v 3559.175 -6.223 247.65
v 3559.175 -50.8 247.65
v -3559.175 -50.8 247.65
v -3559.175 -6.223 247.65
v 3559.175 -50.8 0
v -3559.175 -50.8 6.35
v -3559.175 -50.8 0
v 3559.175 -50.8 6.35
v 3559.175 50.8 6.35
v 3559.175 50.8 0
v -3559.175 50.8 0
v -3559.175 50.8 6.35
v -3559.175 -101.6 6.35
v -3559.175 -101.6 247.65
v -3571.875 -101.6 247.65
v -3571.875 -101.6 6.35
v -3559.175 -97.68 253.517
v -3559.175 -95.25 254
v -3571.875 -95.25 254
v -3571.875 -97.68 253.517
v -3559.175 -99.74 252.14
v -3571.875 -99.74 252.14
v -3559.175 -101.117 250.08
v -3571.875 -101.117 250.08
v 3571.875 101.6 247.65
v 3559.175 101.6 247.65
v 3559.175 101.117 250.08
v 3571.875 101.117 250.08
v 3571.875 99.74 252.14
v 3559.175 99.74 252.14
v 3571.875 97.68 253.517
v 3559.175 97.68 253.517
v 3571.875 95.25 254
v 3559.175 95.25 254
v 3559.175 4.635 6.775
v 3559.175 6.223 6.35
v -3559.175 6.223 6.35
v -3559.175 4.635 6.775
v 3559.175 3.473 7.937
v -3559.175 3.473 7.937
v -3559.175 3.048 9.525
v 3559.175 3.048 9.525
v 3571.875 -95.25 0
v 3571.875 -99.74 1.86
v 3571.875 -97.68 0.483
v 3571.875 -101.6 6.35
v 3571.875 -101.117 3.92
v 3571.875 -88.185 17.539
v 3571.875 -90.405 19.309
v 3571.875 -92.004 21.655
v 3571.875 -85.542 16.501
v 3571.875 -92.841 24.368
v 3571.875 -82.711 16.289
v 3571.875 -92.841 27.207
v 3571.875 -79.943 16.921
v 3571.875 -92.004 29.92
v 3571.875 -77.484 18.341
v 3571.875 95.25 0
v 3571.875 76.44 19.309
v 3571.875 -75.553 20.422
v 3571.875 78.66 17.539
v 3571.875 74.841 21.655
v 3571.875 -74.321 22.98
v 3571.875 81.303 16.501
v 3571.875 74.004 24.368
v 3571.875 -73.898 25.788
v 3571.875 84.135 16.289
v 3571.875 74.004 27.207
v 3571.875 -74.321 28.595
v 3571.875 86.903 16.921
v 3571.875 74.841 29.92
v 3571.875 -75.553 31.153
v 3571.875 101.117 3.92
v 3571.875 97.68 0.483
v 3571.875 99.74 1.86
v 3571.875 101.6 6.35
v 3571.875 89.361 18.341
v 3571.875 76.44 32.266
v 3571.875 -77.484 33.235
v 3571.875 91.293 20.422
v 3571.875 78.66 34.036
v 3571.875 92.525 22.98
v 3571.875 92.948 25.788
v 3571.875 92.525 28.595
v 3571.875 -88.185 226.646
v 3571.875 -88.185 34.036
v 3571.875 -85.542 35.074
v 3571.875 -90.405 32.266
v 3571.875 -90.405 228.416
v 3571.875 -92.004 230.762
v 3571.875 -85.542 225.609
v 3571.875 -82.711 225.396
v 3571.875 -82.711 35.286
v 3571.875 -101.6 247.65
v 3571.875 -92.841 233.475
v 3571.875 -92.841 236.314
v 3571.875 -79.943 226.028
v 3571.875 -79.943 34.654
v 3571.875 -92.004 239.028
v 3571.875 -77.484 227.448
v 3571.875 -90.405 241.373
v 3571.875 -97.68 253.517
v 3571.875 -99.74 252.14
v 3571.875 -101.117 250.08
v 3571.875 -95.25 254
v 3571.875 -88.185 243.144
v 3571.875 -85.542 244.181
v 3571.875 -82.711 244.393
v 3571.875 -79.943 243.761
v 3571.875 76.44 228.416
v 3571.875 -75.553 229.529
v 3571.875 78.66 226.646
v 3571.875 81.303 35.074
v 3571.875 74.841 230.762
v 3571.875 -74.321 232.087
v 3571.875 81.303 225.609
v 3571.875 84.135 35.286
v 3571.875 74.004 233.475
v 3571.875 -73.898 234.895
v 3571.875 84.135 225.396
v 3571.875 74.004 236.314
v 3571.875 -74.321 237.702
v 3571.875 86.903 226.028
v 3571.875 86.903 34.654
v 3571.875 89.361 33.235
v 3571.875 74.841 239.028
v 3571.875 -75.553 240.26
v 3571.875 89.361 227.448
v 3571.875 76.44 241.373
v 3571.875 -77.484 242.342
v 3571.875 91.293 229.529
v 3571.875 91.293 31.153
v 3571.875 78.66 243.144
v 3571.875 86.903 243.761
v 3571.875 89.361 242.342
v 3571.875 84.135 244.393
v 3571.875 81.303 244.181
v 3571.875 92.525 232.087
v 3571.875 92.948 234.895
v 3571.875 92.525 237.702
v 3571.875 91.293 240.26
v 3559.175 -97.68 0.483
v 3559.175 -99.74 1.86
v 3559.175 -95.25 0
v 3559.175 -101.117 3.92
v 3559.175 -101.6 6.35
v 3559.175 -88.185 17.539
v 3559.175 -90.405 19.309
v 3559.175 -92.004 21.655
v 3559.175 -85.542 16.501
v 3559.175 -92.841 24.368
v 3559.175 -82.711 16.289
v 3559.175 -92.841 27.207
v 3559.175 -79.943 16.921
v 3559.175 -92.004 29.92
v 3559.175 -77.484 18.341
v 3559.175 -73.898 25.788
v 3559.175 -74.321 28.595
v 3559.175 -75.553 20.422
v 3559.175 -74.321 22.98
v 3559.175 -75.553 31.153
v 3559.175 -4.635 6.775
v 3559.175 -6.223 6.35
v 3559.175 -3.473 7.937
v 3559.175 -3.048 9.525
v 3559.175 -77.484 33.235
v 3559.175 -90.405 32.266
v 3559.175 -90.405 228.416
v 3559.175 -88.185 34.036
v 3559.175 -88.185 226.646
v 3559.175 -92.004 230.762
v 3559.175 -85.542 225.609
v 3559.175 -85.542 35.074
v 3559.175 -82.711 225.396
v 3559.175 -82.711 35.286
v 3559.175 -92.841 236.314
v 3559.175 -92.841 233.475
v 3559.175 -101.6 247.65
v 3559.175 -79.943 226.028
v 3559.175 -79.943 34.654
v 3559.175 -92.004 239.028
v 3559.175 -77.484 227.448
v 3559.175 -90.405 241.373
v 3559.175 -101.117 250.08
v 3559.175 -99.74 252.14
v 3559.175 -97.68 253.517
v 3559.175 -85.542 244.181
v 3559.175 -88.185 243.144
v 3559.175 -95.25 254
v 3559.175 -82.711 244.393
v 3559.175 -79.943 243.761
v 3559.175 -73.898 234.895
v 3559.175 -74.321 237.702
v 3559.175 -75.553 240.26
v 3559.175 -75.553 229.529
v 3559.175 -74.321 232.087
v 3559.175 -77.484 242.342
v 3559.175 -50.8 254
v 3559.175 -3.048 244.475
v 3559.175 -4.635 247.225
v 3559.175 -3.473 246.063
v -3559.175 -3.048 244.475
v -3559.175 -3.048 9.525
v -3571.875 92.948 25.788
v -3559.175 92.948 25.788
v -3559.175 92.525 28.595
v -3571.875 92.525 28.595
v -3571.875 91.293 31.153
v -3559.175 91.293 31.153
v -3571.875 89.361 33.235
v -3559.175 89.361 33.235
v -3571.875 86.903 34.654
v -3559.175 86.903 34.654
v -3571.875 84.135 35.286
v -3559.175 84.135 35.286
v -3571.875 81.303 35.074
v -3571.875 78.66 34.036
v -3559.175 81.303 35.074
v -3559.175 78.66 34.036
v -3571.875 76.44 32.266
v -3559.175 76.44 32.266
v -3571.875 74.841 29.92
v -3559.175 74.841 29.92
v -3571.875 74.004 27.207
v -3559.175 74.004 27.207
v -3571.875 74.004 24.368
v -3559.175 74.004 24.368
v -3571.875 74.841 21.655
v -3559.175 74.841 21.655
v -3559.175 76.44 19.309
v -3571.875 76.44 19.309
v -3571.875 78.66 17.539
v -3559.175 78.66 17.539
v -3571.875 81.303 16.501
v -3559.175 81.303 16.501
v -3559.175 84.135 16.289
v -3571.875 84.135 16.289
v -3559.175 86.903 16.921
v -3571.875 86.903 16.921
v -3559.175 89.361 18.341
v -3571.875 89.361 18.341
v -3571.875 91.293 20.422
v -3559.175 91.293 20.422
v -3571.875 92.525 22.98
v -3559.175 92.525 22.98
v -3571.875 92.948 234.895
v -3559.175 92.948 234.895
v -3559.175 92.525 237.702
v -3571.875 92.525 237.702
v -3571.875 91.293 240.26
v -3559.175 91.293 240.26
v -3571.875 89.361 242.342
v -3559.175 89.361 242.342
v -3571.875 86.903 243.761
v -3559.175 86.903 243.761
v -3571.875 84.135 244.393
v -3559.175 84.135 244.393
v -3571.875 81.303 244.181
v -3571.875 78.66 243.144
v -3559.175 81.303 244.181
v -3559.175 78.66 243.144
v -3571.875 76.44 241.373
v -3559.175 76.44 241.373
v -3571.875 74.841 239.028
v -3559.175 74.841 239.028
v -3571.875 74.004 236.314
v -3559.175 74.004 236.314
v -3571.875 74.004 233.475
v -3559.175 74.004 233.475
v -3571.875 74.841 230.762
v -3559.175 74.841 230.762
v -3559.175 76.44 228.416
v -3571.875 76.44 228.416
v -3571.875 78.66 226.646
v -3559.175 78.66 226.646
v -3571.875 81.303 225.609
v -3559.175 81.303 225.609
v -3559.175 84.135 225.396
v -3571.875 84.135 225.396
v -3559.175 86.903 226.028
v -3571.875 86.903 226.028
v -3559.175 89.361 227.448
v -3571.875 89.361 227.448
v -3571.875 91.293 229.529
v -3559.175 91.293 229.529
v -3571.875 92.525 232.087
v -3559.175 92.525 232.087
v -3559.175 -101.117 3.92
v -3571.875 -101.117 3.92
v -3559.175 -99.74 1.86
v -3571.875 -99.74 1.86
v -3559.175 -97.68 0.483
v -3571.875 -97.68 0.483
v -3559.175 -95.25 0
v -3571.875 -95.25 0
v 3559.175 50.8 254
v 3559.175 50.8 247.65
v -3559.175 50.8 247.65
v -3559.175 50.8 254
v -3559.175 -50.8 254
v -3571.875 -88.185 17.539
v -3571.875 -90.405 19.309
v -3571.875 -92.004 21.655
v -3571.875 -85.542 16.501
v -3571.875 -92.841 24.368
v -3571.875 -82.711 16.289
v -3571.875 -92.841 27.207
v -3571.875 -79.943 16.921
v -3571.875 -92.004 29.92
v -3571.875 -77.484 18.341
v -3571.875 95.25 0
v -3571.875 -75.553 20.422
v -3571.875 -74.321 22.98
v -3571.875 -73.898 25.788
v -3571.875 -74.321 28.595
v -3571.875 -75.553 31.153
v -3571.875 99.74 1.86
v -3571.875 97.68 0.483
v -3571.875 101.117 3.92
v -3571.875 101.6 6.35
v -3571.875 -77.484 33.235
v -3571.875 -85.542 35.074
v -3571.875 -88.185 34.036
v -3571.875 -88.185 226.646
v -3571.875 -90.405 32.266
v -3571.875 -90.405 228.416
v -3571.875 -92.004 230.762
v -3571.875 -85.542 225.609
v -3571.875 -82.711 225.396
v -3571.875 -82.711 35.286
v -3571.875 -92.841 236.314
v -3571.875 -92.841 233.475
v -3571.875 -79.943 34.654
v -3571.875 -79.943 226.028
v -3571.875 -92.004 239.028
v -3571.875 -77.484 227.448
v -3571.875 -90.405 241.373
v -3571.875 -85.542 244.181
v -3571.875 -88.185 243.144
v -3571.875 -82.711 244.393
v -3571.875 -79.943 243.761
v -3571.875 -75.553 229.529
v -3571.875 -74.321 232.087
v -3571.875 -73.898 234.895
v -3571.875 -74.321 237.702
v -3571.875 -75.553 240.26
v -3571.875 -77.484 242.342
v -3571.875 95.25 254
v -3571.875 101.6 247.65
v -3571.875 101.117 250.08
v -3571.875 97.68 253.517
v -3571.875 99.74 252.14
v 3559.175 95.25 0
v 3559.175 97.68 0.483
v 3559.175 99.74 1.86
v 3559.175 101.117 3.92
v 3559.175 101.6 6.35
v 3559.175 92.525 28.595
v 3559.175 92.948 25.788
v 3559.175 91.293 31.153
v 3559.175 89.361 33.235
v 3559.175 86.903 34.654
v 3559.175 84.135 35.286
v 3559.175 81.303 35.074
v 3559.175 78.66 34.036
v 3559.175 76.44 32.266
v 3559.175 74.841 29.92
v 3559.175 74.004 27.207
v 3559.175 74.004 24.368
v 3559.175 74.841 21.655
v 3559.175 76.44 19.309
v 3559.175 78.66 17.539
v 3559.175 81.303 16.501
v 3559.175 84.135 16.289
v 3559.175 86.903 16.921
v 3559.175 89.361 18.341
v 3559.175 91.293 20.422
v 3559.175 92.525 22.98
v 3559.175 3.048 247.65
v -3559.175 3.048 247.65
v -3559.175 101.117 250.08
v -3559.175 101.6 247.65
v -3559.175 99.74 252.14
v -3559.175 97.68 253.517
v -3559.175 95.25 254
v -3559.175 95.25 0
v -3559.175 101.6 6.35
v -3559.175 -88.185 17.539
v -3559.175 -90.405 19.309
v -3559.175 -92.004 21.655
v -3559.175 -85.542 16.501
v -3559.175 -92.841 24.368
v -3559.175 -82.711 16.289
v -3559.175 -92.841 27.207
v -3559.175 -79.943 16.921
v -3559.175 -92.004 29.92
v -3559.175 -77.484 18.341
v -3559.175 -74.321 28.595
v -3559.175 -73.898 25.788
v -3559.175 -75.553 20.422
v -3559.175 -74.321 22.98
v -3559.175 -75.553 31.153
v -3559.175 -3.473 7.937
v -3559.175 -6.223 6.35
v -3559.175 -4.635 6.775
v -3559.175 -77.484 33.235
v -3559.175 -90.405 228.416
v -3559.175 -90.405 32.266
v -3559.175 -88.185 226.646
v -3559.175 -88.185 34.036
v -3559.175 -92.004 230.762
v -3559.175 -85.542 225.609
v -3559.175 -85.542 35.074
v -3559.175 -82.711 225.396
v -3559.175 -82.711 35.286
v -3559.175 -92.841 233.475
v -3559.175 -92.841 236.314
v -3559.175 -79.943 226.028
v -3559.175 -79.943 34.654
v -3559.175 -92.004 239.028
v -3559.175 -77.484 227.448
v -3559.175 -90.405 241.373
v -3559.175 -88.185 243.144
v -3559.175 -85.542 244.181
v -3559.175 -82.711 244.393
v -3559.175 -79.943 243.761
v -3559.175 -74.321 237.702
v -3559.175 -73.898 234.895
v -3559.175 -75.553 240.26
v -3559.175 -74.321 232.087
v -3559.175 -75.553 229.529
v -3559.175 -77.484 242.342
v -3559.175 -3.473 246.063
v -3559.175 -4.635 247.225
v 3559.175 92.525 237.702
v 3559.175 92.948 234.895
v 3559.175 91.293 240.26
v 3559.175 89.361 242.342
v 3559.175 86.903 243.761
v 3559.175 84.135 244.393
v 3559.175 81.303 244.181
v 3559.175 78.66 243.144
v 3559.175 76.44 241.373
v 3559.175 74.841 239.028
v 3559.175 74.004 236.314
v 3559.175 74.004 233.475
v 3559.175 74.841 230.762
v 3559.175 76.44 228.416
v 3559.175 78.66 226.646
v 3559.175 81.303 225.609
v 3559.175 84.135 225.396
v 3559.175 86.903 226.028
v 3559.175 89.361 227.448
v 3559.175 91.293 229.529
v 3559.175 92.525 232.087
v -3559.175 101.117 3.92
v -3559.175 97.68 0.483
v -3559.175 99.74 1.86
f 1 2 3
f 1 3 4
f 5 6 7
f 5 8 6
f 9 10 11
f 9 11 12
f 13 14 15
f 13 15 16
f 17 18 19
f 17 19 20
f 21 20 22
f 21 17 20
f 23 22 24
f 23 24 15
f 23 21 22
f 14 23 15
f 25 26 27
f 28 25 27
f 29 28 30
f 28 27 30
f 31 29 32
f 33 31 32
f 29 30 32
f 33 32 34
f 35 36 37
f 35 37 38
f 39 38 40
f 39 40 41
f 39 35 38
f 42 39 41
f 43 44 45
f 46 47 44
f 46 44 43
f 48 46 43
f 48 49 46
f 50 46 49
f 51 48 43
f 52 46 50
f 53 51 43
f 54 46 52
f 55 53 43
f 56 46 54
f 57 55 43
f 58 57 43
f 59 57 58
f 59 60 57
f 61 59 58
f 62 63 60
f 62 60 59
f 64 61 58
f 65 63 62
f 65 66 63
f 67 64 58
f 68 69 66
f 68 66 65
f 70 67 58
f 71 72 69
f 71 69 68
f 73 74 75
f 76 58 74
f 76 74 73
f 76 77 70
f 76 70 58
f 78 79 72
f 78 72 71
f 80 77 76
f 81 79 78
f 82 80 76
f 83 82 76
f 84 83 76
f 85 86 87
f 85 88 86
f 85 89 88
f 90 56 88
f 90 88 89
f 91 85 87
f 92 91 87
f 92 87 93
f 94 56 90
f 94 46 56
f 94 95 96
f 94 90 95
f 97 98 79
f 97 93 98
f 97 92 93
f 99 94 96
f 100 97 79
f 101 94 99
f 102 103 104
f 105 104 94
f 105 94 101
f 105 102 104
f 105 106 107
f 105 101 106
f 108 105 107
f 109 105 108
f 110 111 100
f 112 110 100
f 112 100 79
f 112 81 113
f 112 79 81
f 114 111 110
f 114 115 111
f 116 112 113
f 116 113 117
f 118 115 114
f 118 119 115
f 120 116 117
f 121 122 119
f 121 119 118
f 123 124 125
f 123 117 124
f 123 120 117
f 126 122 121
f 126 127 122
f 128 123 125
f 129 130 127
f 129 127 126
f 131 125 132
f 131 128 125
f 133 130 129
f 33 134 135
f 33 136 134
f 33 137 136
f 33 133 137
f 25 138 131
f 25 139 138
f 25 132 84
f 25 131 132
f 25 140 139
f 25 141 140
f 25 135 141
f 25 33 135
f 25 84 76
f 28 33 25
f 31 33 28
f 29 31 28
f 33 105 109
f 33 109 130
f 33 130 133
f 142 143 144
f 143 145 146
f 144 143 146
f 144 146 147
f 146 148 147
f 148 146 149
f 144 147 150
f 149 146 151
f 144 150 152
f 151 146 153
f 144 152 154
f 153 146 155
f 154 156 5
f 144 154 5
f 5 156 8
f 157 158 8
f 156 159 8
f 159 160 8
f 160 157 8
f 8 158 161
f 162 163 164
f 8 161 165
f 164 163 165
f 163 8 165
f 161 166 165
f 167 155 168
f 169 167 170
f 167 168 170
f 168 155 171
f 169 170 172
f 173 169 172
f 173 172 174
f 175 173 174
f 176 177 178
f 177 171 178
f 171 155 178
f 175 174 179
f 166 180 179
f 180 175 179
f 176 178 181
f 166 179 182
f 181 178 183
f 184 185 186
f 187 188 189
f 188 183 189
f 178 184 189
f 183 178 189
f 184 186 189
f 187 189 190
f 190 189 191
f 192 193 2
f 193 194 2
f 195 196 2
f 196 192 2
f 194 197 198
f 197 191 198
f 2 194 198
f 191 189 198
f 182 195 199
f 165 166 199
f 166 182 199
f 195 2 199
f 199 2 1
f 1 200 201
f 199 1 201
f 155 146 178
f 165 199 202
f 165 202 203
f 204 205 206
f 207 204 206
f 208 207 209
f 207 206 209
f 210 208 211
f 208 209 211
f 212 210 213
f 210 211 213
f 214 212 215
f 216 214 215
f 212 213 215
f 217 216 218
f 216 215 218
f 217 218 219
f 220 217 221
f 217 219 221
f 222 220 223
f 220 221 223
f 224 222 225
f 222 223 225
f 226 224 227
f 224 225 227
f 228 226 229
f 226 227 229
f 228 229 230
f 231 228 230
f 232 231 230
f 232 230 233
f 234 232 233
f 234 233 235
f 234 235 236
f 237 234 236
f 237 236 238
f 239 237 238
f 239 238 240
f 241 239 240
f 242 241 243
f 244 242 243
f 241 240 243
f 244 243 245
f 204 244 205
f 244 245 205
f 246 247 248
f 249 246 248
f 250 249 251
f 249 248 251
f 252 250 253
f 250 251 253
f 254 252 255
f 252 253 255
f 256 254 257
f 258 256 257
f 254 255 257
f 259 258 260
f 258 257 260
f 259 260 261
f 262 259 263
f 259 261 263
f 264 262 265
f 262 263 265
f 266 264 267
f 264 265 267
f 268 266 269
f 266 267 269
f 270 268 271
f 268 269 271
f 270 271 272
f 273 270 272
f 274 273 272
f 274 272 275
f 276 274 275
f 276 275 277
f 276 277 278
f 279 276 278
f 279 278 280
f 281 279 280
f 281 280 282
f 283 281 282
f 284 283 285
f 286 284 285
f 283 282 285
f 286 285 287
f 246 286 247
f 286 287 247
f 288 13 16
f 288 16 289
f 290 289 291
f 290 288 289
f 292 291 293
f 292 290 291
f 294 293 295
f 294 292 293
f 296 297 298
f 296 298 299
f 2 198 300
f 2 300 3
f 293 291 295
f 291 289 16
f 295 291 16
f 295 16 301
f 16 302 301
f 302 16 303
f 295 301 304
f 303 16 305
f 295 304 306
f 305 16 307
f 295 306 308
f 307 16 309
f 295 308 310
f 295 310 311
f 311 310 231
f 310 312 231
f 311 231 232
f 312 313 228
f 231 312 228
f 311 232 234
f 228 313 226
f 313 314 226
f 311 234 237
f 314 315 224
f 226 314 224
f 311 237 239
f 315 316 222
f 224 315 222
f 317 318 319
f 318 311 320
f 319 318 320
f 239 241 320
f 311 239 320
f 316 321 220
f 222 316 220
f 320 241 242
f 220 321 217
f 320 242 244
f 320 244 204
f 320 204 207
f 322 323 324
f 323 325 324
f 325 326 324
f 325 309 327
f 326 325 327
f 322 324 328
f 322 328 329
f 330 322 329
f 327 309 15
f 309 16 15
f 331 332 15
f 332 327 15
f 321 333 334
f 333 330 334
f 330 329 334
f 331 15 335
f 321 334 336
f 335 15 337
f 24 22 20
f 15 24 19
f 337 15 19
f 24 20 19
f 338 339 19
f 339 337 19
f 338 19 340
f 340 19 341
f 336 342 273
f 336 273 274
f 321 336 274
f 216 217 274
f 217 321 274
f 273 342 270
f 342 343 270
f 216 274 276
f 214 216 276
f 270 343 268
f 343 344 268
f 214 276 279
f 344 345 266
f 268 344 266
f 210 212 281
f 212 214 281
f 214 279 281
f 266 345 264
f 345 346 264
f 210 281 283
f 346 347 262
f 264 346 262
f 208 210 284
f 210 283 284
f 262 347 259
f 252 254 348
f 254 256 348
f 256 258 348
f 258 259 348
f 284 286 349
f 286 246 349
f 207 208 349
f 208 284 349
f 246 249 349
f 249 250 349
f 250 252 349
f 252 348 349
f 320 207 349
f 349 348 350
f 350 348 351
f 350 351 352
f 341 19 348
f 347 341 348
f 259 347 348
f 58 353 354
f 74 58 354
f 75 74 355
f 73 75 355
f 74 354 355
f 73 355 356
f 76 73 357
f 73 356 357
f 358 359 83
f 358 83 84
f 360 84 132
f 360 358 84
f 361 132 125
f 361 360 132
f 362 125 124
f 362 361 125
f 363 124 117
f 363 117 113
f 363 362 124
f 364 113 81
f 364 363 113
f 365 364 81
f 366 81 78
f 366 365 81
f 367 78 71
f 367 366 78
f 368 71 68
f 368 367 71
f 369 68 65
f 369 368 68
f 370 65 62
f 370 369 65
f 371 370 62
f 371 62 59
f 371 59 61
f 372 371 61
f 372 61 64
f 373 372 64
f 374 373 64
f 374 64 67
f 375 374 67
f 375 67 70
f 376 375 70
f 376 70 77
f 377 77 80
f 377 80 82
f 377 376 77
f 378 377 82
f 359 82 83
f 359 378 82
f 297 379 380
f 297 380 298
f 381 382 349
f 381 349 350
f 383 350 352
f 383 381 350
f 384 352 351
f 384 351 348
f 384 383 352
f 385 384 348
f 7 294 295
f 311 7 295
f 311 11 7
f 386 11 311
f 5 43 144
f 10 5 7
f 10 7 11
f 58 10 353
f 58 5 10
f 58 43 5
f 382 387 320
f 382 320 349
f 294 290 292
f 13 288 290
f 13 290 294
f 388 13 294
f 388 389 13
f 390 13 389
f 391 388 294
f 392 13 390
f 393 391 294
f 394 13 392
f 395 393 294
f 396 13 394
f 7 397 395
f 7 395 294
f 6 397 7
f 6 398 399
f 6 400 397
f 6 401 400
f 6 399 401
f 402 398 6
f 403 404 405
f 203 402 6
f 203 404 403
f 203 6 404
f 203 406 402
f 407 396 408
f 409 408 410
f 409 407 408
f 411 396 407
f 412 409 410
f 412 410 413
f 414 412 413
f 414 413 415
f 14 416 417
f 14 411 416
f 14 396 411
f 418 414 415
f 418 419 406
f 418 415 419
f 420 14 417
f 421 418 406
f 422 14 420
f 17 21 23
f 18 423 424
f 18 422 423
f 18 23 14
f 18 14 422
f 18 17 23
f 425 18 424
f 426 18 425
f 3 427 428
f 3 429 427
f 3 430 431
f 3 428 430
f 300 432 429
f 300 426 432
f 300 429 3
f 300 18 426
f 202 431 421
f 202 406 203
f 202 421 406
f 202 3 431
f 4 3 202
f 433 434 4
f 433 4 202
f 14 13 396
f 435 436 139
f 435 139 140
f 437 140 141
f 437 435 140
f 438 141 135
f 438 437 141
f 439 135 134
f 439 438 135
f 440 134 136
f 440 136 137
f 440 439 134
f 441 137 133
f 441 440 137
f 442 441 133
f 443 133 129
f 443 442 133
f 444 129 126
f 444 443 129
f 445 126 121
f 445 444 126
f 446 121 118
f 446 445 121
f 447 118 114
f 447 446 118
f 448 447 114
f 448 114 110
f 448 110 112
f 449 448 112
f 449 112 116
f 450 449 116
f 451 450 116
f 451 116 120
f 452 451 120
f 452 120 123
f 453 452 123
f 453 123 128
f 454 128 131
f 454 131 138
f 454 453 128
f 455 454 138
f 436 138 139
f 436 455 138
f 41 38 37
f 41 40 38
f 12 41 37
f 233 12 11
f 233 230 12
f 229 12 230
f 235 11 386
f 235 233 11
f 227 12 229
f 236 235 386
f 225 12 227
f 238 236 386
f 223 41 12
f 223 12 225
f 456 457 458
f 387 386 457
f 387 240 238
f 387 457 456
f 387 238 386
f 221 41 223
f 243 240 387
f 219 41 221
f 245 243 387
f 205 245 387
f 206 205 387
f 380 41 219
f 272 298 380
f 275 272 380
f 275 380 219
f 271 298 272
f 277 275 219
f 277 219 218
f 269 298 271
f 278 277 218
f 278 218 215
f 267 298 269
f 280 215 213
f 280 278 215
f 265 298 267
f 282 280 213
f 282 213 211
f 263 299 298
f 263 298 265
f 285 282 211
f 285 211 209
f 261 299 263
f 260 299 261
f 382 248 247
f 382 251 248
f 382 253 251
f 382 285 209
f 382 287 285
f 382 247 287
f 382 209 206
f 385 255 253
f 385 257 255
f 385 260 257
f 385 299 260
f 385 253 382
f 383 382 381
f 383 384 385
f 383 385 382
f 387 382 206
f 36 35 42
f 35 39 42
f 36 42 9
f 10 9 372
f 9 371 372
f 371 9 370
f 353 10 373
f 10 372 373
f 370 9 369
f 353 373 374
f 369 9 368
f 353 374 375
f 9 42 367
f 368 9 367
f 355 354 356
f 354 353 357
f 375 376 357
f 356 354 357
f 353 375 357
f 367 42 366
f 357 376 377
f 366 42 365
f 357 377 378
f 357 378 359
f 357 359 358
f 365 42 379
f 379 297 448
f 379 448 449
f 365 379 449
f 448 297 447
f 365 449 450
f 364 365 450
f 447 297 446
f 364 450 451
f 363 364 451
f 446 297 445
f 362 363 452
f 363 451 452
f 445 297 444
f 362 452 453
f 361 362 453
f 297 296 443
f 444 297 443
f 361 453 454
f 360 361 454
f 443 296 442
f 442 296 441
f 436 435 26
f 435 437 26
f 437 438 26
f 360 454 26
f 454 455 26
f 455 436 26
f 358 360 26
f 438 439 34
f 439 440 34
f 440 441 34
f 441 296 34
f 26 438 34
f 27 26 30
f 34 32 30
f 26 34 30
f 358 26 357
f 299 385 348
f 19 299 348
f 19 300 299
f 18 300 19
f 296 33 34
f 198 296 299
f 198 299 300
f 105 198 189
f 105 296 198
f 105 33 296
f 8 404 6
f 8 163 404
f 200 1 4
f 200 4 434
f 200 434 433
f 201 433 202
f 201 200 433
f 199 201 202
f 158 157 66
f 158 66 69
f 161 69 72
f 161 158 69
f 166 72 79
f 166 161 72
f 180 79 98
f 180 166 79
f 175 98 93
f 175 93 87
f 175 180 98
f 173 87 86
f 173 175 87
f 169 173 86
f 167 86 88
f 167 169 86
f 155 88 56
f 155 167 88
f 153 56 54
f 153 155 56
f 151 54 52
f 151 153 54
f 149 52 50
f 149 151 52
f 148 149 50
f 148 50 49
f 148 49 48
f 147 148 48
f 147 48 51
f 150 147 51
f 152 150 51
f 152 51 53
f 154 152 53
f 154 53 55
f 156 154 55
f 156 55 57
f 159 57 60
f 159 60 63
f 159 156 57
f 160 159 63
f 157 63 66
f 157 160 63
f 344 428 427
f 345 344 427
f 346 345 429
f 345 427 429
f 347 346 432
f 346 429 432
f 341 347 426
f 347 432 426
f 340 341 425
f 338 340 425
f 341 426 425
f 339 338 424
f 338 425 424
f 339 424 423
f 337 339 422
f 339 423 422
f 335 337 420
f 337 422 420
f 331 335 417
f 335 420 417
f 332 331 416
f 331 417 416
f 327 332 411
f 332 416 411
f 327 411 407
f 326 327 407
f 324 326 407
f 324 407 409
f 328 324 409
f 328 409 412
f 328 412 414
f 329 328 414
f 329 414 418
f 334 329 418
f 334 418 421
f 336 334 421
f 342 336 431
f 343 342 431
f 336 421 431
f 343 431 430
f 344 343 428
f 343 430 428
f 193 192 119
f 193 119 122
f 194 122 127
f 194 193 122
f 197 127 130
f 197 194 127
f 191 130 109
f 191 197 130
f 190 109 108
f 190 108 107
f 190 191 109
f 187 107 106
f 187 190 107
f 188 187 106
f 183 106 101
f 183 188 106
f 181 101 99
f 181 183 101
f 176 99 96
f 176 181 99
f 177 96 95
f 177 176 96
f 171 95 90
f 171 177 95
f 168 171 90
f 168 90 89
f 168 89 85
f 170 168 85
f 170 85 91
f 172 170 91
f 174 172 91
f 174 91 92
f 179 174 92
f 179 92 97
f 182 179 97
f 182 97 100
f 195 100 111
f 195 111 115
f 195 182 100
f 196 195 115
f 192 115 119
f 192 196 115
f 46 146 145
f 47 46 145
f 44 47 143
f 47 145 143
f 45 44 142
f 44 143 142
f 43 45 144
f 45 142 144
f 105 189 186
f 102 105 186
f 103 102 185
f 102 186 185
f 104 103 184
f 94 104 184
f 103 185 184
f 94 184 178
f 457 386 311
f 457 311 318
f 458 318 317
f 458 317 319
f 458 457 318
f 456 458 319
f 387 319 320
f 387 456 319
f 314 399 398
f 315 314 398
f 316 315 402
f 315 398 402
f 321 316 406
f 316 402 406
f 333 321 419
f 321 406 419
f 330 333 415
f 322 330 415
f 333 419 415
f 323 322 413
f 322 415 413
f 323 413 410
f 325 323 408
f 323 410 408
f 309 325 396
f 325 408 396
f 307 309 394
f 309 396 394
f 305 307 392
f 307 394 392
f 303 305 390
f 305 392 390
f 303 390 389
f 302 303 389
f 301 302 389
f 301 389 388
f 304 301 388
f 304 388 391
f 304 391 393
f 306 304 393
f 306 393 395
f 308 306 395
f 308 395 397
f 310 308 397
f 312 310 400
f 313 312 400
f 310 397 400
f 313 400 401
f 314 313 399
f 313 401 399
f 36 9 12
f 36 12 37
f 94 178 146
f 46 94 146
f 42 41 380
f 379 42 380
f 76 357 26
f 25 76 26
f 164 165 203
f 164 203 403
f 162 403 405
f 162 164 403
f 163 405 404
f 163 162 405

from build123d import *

# Parameters (mm, degrees)
F1_DEPTH = 3559.175
F2_R     = 9.525
F3_DEPTH = 12.7


with BuildPart() as f1:
    # F0 (on Right) → F1 (new body, symmetric)
    with BuildSketch(Plane.YZ):
        with BuildLine():
            Line((-50.8, 0), (0, 0))
            Line((0, 0), (50.8, 0))
            Line((50.8, 0), (50.8, 6.35))
            Line((50.8, 6.35), (6.223, 6.35))
            ThreePointArc((6.223, 6.35), (3.9779359697, 7.2799359697), (3.048, 9.525))
            Line((3.048, 9.525), (3.048, 247.65))
            Line((3.048, 247.65), (50.8, 247.65))
            Line((50.8, 247.65), (50.8, 254))
            Line((50.8, 254), (0, 254))
            Line((0, 254), (-50.8, 254))
            Line((-50.8, 254), (-50.8, 247.65))
            Line((-50.8, 247.65), (-6.223, 247.65))
            ThreePointArc((-6.223, 247.65), (-3.9779359697, 246.7200640303), (-3.048, 244.475))
            Line((-3.048, 244.475), (-3.048, 9.525))
            ThreePointArc((-3.048, 9.525), (-3.9779359697, 7.2799359697), (-6.223, 6.35))
            Line((-6.223, 6.35), (-50.8, 6.35))
            Line((-50.8, 6.35), (-50.8, 0))
        make_face()
    extrude(amount=F1_DEPTH, both=True)

    # F2 (on face) → F3 (join)
    with BuildSketch(Plane.YZ.offset(3559.175)):
        with BuildLine():
            ThreePointArc((101.6, 247.65), (99.7401280605, 252.1401280605), (95.25, 254))
            Line((95.25, 254), (-95.25, 254))
            ThreePointArc((-95.25, 254), (-99.7401280605, 252.1401280605), (-101.6, 247.65))
            Line((-101.6, 247.65), (-101.6, 6.35))
            ThreePointArc((-101.6, 6.35), (-99.7401280605, 1.8598719395), (-95.25, 0))
            Line((-95.25, 0), (95.25, 0))
            ThreePointArc((95.25, 0), (99.7401280605, 1.8598719395), (101.6, 6.35))
            Line((101.6, 6.35), (101.6, 247.65))
        make_face()
        with Locations((-83.4227353334, 25.7875584066)):
            Circle(F2_R, mode=Mode.SUBTRACT)
        with Locations((83.4227353334, 25.7875584066)):
            Circle(F2_R, mode=Mode.SUBTRACT)
        with Locations((-83.4227353334, 234.8948270082)):
            Circle(F2_R, mode=Mode.SUBTRACT)
        with Locations((83.4227353334, 234.8948270082)):
            Circle(F2_R, mode=Mode.SUBTRACT)
    extrude(amount=F3_DEPTH)

    # F4: F1 across plane


with BuildPart() as f1_1:
    add(f1.part)
    add(f1.part.mirror(Plane.YZ))


solid = f1_1.part
